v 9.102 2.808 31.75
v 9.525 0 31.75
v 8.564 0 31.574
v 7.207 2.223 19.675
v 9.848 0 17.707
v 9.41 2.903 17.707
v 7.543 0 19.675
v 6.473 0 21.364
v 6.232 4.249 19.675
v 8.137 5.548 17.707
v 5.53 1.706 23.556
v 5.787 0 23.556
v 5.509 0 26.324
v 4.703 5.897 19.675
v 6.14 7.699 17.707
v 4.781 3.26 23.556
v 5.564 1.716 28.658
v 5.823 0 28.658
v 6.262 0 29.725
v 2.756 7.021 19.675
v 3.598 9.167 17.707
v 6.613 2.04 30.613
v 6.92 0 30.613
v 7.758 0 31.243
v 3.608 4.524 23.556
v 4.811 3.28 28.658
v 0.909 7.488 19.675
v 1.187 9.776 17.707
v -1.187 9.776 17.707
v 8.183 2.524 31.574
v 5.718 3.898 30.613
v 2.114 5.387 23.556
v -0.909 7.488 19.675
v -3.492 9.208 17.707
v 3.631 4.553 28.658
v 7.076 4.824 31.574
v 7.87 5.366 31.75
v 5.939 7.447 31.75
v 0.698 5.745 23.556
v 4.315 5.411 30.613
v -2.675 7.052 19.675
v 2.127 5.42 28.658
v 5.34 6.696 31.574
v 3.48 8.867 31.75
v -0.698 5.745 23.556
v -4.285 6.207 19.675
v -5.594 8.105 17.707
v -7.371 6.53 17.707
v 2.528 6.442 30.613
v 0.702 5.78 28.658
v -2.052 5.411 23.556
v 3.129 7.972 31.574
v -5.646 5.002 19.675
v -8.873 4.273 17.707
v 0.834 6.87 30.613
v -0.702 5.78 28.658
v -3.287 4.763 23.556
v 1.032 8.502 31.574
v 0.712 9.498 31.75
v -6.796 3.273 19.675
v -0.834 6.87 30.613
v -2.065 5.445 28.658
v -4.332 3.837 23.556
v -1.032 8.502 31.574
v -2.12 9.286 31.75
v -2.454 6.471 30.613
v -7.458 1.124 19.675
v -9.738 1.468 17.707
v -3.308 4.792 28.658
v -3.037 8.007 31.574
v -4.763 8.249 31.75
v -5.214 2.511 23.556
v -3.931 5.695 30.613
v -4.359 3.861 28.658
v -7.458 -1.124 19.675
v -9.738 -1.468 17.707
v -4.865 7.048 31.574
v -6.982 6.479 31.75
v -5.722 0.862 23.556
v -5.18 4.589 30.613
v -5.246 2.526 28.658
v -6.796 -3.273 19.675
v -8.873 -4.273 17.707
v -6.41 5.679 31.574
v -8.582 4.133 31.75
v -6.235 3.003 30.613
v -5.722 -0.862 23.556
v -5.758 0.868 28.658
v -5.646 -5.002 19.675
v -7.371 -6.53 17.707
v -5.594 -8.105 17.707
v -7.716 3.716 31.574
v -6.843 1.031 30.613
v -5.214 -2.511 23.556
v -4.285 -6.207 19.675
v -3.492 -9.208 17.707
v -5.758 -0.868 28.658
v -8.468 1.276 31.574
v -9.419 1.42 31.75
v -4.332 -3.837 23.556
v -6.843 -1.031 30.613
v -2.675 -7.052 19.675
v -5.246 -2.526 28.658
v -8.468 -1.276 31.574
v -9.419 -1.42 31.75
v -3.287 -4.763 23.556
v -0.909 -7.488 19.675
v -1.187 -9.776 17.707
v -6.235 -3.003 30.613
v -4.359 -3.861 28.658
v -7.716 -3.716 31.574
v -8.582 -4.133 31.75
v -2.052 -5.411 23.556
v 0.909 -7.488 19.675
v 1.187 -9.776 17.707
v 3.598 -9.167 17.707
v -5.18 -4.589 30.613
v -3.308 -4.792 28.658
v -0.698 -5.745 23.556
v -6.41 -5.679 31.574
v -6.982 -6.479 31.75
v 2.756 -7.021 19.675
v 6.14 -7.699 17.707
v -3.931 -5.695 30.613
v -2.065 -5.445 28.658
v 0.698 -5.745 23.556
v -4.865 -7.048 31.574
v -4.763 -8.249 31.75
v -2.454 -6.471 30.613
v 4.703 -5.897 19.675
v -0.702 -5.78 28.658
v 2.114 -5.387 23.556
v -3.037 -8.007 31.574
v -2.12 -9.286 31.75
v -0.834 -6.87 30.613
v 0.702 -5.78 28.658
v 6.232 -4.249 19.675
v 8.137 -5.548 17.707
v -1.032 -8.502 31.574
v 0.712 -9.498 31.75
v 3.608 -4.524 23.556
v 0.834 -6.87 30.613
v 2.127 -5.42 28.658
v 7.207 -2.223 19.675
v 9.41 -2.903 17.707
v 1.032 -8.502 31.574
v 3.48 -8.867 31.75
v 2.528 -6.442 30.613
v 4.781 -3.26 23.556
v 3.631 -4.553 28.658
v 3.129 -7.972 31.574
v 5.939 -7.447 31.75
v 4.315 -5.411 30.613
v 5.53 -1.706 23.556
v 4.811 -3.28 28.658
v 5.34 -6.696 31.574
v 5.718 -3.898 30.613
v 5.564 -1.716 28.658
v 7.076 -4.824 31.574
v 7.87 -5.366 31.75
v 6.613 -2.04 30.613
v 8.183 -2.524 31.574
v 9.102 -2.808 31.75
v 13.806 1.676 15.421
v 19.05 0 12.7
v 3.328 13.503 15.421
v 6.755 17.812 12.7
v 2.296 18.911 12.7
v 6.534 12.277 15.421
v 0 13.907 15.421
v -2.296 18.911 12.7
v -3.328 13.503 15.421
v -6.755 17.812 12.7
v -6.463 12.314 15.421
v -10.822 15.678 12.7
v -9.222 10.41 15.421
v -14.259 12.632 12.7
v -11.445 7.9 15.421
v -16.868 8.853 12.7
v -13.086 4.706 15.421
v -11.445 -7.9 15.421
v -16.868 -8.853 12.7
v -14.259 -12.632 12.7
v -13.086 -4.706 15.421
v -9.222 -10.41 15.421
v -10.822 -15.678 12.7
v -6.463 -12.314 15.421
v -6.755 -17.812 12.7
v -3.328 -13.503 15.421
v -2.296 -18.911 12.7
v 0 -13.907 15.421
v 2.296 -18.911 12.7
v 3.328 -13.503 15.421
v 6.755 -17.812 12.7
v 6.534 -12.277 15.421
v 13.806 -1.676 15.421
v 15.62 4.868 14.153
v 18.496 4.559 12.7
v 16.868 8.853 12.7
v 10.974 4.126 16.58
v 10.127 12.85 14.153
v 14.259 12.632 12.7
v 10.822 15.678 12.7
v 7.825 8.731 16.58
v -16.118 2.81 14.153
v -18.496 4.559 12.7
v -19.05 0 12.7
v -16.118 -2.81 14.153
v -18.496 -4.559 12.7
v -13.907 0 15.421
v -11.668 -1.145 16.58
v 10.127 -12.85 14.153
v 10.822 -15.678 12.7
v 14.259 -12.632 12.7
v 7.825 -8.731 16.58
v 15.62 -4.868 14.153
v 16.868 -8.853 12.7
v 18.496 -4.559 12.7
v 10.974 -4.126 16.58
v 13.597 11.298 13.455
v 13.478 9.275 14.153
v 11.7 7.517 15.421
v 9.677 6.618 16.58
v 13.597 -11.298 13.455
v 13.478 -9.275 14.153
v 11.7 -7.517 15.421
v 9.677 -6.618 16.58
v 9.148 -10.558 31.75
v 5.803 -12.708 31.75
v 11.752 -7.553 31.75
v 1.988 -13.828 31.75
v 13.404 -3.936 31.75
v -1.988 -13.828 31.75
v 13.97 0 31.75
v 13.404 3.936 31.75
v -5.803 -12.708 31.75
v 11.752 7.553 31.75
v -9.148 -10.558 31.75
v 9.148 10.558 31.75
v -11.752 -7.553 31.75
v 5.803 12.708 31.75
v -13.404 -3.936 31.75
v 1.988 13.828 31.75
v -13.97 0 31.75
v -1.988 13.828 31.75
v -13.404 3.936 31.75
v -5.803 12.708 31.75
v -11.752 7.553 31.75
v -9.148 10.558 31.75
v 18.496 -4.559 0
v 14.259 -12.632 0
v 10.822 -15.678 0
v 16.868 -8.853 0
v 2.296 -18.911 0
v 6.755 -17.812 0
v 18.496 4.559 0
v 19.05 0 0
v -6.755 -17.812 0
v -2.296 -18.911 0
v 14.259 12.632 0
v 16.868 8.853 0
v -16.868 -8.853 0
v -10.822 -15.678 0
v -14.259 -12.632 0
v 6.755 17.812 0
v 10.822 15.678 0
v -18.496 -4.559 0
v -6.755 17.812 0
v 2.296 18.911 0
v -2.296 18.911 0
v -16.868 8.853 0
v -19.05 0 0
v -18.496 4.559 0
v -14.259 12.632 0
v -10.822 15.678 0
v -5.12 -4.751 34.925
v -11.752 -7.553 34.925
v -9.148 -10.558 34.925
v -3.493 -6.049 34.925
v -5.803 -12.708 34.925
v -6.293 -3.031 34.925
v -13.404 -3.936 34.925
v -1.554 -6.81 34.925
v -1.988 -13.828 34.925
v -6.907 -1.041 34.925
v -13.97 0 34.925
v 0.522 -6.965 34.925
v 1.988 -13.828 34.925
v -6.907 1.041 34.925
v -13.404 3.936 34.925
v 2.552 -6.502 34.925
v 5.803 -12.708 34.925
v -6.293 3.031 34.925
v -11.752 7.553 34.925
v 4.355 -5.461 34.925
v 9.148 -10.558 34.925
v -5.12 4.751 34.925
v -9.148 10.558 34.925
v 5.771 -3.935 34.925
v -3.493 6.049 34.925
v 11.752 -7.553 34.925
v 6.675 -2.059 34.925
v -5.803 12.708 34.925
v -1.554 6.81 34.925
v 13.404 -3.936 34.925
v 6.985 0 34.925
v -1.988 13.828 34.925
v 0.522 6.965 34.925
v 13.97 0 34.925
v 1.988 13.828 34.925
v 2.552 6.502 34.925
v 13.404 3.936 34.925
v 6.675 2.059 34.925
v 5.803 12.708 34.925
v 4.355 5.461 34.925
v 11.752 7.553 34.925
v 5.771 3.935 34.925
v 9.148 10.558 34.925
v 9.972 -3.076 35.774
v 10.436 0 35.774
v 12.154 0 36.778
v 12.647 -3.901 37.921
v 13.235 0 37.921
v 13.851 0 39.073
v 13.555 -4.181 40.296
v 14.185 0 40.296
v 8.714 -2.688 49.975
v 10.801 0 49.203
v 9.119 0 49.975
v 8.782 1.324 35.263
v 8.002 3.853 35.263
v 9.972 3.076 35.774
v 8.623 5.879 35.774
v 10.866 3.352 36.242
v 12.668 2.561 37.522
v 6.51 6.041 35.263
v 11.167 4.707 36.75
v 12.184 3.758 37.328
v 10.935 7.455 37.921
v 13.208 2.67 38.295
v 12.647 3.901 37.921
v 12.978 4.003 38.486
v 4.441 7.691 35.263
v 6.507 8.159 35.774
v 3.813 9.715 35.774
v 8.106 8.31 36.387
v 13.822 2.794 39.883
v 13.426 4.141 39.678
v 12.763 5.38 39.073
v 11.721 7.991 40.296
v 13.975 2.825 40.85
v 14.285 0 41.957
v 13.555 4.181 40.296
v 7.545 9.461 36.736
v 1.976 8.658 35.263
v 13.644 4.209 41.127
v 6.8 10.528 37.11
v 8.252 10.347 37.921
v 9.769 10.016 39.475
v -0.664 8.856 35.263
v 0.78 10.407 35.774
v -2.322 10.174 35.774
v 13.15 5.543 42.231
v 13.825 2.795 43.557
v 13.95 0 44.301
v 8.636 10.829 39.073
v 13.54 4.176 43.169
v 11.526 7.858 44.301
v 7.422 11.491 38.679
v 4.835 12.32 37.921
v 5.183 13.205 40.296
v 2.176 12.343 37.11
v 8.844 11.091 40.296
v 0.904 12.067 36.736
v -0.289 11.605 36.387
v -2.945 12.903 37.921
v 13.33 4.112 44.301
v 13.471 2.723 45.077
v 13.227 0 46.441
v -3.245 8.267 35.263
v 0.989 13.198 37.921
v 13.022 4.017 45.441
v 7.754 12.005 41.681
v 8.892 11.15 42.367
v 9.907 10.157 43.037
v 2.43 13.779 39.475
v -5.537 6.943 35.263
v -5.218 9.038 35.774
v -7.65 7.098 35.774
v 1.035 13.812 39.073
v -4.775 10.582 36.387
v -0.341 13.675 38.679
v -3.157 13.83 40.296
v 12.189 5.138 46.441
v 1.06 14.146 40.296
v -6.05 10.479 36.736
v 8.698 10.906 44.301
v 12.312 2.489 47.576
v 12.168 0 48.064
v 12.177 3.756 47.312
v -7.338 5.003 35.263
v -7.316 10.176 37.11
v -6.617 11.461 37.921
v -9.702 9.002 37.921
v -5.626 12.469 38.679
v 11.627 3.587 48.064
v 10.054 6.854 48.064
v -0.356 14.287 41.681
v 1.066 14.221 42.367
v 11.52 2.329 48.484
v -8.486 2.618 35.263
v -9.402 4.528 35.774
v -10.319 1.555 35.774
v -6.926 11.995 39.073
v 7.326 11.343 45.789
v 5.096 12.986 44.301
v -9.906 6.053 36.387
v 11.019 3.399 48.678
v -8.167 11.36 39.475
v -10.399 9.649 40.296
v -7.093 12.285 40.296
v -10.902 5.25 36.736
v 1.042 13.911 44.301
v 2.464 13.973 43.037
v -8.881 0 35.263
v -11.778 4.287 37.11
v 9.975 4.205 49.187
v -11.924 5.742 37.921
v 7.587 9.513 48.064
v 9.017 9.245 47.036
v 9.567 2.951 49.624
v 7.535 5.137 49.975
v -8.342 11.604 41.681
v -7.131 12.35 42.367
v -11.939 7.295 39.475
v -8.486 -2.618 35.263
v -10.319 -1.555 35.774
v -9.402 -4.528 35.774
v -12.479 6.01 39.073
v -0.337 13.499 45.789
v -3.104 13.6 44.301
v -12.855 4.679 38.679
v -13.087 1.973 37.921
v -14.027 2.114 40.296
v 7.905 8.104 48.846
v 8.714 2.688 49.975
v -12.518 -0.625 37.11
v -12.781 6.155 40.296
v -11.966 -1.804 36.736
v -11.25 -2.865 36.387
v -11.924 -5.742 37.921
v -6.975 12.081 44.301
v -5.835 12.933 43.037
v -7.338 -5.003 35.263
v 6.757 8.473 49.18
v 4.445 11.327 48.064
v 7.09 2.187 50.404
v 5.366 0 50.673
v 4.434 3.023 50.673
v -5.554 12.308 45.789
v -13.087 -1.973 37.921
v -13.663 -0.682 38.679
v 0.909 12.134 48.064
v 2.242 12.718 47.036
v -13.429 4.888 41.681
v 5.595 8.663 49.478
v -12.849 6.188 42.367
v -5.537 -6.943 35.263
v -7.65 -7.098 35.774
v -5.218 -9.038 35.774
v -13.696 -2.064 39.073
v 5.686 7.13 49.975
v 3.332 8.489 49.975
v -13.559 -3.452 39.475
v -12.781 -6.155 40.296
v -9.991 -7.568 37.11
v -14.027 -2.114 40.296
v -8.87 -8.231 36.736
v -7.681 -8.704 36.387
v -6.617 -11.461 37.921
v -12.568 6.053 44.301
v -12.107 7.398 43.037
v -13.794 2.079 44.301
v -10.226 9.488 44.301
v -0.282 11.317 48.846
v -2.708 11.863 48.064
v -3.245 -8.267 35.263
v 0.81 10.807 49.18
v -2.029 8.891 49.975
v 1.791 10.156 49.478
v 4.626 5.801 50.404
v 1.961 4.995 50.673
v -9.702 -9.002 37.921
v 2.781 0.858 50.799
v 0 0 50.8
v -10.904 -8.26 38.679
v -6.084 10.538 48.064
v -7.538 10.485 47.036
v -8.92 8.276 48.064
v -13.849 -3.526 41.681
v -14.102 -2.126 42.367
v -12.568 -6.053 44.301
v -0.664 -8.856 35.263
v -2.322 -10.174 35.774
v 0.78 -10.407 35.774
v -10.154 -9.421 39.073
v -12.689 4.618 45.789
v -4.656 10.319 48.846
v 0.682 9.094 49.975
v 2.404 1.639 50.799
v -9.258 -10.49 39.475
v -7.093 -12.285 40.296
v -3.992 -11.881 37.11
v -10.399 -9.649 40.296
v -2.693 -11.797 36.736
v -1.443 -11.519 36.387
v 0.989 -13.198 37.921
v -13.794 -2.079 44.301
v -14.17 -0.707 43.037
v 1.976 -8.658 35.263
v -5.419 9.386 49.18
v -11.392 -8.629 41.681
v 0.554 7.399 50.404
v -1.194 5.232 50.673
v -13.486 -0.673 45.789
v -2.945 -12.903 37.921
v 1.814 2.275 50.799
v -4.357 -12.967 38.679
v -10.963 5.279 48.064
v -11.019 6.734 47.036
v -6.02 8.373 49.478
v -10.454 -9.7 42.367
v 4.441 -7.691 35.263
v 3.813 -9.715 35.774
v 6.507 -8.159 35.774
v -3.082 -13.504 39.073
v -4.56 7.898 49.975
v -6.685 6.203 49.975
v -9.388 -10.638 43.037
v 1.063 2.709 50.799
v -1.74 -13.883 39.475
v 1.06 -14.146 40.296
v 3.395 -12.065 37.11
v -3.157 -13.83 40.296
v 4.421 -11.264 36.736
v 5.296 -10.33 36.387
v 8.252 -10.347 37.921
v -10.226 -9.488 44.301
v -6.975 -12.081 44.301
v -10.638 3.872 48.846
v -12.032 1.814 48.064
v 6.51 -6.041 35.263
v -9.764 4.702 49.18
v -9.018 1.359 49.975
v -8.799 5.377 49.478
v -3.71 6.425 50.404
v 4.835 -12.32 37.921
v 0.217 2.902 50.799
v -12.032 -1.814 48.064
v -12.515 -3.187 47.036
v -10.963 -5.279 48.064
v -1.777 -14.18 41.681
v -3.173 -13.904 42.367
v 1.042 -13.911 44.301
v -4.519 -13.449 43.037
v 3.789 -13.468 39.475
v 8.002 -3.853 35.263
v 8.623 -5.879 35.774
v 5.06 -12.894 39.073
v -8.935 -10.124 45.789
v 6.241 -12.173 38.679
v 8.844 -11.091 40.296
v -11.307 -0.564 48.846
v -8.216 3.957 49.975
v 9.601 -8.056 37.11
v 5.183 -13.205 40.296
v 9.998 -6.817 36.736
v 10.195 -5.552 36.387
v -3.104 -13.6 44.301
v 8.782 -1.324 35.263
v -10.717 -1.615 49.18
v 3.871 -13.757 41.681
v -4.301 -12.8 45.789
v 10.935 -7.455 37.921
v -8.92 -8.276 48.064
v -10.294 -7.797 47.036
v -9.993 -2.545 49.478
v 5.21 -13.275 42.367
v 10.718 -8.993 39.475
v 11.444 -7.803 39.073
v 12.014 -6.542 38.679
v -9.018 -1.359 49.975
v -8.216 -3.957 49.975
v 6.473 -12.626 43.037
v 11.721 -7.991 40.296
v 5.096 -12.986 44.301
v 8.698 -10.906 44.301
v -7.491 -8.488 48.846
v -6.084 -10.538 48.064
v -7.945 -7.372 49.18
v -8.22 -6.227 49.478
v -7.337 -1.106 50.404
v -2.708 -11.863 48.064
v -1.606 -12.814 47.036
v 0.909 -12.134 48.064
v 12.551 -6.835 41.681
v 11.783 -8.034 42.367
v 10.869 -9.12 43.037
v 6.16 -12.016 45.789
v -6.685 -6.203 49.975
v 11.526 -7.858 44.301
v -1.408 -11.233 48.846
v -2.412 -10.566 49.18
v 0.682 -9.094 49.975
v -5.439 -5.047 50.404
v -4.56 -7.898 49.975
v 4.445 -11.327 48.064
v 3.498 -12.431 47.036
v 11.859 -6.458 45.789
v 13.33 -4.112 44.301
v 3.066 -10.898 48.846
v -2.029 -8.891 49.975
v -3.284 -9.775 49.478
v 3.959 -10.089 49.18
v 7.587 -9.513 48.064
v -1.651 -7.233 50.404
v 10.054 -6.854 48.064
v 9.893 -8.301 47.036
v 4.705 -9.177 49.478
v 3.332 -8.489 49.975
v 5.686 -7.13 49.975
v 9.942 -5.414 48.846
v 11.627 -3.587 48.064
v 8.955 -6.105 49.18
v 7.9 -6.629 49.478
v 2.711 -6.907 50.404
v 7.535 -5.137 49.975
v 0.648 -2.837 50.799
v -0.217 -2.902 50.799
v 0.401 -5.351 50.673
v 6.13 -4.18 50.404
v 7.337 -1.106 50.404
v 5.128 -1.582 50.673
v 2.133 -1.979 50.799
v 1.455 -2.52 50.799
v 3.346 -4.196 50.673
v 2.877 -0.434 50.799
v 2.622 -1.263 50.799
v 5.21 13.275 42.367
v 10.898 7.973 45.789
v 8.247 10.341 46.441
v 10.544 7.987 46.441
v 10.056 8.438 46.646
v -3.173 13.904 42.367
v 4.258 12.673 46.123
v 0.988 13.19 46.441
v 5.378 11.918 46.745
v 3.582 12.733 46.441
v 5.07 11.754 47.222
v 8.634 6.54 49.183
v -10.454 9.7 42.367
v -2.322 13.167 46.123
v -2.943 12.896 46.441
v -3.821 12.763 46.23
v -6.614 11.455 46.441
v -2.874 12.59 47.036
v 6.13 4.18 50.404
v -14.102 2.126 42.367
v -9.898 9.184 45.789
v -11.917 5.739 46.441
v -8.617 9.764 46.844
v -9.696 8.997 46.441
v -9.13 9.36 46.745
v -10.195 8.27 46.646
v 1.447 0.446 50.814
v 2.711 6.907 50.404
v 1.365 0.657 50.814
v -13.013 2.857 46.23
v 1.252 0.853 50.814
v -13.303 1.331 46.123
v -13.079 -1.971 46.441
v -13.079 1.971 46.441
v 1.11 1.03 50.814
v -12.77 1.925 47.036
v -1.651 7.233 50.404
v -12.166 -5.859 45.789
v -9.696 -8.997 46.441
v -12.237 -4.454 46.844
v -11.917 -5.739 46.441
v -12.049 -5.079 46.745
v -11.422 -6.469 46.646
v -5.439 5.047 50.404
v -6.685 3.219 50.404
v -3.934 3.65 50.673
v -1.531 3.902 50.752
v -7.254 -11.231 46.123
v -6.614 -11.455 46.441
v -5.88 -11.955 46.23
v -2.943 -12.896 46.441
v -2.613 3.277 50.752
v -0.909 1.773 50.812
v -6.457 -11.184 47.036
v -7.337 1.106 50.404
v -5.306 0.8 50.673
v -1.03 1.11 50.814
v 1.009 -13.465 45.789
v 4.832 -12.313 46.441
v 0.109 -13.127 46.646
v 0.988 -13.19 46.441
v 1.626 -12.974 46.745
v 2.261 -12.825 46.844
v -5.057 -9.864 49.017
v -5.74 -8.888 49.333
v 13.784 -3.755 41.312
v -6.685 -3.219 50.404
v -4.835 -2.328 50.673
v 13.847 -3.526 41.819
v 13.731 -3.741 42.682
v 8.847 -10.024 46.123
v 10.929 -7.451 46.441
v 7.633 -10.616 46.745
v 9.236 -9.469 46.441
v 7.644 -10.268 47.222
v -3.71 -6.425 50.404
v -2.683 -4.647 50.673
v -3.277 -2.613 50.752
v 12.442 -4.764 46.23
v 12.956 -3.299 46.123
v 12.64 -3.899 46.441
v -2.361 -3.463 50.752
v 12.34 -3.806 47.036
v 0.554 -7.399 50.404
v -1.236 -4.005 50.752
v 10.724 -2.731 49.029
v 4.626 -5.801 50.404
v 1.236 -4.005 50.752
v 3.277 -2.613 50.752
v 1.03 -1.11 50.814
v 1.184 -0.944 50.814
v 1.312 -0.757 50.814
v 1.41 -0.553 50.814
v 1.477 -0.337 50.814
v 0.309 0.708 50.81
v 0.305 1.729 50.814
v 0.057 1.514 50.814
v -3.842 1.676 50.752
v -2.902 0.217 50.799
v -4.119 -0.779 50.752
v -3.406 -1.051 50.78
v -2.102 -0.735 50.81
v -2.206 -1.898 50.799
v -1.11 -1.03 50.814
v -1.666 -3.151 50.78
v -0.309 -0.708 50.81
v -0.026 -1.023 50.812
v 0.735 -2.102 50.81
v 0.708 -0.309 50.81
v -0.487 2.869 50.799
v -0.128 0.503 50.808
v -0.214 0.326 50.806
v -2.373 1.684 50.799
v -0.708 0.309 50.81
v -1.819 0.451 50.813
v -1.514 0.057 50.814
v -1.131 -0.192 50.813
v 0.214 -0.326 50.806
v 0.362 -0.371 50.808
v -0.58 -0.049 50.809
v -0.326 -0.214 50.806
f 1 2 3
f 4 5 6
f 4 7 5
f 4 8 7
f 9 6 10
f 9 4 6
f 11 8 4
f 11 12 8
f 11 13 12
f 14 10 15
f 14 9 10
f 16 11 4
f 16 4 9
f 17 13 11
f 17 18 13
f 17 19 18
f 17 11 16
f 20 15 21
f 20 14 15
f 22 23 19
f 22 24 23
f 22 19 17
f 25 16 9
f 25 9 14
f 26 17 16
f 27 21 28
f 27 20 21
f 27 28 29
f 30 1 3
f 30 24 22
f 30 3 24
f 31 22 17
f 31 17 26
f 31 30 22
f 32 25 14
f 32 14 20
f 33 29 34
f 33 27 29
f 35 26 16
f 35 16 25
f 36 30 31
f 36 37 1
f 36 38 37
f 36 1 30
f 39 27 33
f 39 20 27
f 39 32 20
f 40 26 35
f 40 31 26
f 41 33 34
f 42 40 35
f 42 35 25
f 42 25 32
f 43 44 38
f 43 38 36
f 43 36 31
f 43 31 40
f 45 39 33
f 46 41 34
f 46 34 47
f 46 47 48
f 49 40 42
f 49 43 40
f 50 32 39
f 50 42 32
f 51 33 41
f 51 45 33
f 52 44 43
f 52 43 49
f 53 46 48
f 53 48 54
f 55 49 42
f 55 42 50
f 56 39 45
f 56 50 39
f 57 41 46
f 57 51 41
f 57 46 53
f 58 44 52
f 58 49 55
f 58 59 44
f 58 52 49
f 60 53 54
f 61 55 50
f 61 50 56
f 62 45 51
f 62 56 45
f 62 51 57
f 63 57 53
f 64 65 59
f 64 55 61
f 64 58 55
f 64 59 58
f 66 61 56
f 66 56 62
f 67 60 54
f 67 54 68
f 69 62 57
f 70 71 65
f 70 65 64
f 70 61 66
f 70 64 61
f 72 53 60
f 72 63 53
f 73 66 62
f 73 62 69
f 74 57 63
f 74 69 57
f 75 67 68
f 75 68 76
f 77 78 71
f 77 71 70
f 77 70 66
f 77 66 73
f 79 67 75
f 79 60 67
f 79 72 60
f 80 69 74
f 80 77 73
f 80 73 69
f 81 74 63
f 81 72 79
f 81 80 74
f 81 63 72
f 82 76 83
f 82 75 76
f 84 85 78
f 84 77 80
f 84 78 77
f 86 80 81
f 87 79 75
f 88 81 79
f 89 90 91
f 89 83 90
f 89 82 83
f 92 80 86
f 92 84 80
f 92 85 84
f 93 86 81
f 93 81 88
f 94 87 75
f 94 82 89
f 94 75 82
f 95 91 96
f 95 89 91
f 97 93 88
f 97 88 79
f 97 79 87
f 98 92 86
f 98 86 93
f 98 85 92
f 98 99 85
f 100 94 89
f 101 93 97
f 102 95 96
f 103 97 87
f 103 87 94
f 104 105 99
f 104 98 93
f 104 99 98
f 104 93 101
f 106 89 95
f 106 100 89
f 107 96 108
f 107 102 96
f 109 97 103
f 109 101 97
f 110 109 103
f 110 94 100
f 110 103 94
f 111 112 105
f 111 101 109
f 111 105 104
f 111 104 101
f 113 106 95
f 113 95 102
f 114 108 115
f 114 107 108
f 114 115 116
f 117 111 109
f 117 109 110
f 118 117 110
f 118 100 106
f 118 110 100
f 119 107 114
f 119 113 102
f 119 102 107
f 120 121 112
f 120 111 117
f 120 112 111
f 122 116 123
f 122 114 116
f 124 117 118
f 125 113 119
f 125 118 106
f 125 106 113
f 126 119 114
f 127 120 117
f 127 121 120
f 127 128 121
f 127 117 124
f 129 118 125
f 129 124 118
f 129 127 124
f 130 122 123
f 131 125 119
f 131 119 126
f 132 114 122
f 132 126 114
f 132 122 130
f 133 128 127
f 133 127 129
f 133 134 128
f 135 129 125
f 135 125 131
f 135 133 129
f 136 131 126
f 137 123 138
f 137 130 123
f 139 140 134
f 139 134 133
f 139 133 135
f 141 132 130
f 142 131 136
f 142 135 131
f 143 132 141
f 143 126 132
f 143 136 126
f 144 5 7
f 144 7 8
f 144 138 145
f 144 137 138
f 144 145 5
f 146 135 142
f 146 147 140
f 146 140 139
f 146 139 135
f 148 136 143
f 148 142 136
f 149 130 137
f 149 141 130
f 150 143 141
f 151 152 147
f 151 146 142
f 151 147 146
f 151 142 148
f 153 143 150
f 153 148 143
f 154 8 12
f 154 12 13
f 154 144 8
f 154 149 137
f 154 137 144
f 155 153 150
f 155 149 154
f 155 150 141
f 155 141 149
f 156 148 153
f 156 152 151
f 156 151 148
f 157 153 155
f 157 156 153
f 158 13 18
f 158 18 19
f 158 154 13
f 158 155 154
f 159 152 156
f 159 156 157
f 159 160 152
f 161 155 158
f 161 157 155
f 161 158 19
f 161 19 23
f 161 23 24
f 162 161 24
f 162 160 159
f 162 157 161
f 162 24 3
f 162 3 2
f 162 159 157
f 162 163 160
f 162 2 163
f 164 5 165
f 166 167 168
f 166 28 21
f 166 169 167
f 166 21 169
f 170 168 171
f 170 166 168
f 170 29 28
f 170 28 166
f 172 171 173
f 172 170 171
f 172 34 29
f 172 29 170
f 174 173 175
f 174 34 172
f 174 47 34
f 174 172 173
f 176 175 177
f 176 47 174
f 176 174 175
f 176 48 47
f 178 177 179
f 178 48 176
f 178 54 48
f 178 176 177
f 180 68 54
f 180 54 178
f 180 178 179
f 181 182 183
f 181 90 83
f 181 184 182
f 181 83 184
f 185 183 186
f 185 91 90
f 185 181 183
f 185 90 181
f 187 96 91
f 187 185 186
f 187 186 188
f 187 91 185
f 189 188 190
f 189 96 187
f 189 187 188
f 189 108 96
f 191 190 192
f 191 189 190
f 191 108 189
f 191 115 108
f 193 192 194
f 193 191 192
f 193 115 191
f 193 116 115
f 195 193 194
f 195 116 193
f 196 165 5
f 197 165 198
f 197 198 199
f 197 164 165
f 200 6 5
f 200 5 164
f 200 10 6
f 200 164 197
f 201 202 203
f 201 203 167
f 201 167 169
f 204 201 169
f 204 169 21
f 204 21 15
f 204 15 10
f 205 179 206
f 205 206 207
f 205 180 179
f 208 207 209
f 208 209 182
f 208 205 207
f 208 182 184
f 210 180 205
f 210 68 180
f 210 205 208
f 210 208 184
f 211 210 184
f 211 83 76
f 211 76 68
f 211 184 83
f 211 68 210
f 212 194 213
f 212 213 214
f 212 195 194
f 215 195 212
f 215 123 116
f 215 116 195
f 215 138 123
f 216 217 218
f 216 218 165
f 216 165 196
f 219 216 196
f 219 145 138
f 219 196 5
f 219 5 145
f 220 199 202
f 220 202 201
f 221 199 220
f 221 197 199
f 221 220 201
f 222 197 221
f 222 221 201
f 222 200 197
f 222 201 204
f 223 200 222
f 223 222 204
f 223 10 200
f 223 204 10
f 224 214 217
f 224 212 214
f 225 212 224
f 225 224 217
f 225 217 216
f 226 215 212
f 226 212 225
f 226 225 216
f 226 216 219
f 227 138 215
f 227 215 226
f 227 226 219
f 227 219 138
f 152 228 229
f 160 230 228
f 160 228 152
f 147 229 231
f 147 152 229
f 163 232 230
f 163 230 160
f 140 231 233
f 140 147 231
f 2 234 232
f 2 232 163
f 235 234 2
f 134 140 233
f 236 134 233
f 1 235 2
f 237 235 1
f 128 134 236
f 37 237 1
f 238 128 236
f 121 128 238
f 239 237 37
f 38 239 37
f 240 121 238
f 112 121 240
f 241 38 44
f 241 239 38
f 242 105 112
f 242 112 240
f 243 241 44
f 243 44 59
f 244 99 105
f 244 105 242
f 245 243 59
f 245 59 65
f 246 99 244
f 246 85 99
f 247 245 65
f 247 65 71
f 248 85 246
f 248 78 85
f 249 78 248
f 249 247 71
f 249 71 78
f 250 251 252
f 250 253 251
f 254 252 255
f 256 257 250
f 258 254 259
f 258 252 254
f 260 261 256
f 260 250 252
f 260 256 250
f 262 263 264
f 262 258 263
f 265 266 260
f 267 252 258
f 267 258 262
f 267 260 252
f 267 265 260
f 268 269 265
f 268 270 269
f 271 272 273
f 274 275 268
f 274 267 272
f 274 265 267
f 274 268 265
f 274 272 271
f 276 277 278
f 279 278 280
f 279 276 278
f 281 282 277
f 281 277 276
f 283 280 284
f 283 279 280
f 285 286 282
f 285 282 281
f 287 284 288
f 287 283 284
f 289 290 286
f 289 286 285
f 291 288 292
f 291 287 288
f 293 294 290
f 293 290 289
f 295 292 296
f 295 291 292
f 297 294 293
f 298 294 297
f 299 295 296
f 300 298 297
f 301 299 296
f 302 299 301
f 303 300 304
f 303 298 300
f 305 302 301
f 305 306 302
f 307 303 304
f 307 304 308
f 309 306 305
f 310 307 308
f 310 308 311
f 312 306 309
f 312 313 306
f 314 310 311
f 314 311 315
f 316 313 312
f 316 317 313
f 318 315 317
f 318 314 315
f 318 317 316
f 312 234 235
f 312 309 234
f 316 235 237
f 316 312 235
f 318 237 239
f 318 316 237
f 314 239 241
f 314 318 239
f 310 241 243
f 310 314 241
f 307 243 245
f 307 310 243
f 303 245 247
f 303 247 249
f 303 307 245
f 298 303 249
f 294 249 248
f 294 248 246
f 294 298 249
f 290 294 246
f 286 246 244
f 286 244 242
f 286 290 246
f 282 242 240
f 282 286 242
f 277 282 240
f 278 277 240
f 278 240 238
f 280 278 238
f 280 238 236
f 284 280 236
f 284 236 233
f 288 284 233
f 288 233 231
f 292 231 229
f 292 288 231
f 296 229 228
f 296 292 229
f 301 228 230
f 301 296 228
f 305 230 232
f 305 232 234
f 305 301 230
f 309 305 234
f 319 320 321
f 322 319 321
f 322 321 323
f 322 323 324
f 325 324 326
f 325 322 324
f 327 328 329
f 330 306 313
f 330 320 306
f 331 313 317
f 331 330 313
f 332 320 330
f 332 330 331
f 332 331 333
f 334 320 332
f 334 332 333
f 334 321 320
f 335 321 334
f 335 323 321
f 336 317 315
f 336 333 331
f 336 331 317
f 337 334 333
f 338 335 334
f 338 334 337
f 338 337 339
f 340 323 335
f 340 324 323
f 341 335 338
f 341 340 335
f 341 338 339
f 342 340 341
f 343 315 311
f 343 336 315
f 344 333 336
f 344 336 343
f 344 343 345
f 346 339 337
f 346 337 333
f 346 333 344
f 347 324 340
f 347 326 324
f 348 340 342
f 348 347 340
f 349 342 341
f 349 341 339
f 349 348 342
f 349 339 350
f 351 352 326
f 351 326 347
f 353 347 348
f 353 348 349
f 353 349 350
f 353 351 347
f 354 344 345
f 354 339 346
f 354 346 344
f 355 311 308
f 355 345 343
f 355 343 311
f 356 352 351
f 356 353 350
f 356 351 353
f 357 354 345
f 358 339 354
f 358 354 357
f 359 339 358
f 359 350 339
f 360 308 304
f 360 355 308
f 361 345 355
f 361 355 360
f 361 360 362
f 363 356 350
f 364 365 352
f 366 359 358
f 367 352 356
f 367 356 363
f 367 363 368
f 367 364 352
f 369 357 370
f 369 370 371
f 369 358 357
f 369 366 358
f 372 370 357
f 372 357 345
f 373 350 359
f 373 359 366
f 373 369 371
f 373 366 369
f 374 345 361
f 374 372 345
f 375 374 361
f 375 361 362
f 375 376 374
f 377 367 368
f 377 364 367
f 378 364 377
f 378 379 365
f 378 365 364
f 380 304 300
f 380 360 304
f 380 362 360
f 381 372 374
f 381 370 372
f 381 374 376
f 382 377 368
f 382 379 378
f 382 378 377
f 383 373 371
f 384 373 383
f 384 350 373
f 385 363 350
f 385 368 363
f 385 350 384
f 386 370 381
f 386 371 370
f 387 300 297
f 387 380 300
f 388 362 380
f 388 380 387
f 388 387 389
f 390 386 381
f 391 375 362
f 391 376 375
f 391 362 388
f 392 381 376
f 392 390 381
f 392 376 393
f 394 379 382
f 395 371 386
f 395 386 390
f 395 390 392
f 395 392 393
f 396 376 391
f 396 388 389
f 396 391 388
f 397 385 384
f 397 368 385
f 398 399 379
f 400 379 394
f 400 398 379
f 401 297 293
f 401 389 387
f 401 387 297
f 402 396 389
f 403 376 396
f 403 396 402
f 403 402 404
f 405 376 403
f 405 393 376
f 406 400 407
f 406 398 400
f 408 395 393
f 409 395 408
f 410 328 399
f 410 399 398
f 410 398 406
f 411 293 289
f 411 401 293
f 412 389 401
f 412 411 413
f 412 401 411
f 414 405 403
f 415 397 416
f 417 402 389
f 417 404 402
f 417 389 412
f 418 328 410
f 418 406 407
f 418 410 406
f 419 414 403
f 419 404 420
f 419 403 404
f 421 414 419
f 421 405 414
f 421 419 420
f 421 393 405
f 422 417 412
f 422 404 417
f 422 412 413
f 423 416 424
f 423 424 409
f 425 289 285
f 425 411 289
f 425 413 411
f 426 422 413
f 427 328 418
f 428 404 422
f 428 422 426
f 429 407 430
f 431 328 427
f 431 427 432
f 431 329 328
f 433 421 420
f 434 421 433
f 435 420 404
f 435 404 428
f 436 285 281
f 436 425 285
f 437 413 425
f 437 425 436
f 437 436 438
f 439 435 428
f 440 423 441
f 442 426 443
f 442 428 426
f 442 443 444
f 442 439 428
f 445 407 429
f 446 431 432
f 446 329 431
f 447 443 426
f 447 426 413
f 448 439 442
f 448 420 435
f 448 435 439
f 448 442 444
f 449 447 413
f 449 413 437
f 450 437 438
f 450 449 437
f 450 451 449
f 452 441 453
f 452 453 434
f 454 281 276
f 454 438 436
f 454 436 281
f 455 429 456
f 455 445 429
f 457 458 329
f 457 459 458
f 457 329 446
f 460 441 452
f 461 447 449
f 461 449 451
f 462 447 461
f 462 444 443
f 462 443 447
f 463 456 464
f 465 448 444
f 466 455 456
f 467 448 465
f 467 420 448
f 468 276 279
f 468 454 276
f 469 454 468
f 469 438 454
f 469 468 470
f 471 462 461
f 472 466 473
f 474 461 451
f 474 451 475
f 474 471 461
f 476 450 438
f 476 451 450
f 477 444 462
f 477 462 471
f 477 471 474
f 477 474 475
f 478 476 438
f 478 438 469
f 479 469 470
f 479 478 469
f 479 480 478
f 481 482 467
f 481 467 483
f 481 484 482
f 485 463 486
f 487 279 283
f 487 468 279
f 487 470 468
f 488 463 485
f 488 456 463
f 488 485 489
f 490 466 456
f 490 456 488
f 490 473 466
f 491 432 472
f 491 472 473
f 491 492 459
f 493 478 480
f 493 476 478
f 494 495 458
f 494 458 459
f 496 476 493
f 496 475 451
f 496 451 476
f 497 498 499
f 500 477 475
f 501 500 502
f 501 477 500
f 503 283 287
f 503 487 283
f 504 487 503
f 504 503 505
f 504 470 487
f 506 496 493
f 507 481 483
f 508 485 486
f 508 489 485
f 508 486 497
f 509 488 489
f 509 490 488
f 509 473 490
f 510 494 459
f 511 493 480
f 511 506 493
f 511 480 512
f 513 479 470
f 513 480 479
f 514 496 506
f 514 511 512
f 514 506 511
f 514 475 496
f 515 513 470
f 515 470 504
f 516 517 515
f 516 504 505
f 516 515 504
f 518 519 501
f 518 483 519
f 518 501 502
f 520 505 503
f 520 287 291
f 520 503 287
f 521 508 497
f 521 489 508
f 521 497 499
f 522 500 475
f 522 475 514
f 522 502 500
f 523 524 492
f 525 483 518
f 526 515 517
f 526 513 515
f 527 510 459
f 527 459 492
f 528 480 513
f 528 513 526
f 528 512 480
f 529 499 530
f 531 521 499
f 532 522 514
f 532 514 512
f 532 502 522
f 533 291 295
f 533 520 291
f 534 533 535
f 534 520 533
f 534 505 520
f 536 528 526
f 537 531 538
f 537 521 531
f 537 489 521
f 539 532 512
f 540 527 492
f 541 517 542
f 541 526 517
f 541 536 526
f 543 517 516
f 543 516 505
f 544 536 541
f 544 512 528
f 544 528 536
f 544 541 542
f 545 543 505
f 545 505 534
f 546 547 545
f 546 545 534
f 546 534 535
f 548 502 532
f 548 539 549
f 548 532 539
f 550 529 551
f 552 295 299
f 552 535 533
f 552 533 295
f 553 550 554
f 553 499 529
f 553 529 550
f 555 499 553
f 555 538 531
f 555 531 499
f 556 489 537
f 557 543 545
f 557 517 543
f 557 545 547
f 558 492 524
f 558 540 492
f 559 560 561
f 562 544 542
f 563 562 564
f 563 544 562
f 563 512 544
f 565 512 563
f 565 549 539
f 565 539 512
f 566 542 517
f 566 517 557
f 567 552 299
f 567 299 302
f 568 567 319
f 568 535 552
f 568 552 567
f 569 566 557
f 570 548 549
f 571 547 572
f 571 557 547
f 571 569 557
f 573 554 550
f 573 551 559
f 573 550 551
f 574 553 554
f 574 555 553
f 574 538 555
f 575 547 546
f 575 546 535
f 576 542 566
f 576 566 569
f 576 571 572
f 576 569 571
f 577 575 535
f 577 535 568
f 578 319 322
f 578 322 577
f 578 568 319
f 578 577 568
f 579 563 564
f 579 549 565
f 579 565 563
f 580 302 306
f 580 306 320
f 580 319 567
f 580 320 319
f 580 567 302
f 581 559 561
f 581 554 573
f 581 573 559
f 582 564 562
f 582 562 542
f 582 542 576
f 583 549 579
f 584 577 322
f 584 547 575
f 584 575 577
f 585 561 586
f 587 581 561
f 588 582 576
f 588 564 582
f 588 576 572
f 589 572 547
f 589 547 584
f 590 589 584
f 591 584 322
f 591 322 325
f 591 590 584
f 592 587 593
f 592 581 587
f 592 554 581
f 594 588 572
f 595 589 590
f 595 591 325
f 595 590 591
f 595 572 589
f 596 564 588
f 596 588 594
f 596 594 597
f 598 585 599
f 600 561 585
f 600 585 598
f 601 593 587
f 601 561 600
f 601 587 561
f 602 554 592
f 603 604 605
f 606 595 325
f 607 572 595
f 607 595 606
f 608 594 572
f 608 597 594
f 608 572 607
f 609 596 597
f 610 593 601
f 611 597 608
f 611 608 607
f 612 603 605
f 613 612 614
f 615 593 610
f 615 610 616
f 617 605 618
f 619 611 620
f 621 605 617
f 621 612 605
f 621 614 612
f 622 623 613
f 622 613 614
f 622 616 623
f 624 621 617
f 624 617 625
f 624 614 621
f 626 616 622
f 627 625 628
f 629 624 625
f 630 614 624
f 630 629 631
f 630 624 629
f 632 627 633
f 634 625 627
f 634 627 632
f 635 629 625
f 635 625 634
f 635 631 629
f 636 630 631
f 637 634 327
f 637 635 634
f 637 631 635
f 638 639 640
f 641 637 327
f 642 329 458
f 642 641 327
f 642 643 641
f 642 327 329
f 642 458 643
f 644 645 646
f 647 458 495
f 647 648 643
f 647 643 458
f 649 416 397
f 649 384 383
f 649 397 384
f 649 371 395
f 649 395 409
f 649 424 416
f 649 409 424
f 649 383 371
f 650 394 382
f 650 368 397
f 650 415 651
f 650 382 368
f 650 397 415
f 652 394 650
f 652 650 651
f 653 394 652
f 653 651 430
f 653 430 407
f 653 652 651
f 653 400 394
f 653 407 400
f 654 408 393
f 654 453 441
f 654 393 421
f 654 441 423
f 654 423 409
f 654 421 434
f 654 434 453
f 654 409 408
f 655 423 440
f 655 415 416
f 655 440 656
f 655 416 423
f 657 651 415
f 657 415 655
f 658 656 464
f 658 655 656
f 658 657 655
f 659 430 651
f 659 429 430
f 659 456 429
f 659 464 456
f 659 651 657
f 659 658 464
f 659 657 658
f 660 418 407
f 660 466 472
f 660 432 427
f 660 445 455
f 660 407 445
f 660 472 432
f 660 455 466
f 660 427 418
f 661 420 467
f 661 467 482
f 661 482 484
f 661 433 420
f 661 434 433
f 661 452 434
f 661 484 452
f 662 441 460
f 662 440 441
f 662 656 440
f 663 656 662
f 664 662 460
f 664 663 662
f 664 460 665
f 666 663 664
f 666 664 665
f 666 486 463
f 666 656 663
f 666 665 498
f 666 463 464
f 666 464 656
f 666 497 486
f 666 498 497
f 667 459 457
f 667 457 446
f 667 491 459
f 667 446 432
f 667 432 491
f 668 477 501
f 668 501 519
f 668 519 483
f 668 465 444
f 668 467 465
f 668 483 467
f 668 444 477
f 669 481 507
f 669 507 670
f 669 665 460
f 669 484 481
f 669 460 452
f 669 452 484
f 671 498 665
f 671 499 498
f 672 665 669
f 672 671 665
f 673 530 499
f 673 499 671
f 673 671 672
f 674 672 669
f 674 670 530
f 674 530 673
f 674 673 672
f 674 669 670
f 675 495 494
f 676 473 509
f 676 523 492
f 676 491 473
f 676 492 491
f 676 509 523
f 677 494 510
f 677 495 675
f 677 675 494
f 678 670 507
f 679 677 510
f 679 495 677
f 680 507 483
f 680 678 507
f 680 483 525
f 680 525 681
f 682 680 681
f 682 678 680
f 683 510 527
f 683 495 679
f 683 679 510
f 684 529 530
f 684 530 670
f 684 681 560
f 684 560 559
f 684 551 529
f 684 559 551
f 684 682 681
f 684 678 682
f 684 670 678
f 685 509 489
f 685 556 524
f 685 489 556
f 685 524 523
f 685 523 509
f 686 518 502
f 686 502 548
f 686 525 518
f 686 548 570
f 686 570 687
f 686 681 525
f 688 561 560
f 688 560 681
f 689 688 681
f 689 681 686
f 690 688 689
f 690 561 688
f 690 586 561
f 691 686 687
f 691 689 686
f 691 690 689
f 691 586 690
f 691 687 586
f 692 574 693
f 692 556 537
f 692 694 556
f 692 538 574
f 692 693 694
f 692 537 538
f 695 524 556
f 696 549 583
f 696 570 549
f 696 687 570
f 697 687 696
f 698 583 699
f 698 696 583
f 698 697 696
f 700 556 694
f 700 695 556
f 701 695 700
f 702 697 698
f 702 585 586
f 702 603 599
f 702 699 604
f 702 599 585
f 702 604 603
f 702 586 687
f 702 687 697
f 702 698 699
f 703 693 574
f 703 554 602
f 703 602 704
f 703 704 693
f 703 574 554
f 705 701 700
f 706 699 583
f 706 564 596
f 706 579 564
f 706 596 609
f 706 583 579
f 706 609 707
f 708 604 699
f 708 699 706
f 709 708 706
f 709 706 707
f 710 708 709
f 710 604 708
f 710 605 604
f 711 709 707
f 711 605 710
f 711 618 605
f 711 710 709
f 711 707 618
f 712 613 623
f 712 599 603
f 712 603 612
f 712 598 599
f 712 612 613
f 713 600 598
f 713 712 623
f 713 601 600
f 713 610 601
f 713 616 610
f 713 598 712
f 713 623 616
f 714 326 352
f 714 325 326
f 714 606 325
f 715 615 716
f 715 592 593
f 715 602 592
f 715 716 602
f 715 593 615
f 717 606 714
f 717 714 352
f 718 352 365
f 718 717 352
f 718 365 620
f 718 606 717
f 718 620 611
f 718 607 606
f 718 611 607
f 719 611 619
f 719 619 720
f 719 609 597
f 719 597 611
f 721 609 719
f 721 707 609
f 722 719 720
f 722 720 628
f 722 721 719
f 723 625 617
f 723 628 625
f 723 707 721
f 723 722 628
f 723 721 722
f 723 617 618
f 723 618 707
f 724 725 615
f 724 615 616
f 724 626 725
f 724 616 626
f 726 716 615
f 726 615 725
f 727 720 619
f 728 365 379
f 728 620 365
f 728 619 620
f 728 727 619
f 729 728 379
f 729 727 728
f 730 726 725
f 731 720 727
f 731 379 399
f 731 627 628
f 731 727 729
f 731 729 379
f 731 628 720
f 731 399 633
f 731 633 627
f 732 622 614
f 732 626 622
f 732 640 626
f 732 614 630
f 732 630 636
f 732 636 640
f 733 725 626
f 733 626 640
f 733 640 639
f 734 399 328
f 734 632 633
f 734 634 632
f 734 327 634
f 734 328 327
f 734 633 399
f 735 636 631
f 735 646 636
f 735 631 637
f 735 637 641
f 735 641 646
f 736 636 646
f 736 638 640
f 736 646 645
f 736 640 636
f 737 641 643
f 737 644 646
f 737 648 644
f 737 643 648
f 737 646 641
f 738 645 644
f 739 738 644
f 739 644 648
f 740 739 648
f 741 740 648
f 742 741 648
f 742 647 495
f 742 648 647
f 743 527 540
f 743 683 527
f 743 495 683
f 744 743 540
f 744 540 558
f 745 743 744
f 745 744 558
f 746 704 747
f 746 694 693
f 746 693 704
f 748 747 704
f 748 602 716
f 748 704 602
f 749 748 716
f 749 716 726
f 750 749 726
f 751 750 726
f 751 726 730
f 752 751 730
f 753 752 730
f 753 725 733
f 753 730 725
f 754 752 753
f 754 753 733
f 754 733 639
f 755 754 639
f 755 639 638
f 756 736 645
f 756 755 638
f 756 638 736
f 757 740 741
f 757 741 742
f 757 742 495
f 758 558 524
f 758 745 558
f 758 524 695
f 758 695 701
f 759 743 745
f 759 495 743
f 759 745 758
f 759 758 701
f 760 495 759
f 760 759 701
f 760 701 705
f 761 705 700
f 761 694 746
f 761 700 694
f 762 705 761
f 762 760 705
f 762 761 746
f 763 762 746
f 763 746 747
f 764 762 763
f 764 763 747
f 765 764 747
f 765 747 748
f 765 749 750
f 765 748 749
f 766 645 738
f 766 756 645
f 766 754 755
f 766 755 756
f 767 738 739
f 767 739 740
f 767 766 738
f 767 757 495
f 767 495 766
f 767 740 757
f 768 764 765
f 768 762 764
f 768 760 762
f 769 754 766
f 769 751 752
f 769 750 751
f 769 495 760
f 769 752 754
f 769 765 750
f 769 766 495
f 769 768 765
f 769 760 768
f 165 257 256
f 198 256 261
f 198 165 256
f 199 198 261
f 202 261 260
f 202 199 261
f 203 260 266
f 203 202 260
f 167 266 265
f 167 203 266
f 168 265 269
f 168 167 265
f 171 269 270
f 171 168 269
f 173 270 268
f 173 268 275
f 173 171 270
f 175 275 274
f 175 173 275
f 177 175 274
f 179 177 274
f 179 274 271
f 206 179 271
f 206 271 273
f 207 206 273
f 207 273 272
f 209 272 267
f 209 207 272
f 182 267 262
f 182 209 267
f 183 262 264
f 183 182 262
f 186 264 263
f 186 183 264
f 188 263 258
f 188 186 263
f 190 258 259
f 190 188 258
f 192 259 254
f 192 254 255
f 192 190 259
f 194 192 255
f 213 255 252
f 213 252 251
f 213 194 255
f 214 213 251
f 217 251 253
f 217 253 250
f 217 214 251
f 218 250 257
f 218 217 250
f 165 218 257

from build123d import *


with BuildPart() as f1:
    # F0 (on Front) → F1 (revolve)
    with BuildSketch(Plane.XZ):
        with BuildLine():
            Line((0, 50.8), (0, 34.925))
            Line((0, 34.925), (6.985, 34.925))
            add(Edge.make_bspline(
                [(6.985, 34.925), (14.7014663656, 35.8285003282), (14.7579266168, 44.3466005075), (11.2465458357, 50.1659365692), (5.7059846608, 50.9006321078), (0, 50.8)],
                knots=[0, 0, 0, 0, 0.372820087, 0.6340680412, 1, 1, 1, 1], degree=3))
        make_face()
        Polygon((0, 34.925), (0, 31.75), (9.525, 31.75), (13.97, 31.75), (13.97, 34.925), (6.985, 34.925), align=None)
        with BuildLine():
            Line((0, 31.75), (0, 0))
            Line((0, 0), (19.05, 0))
            Line((19.05, 0), (19.05, 12.7))
            add(Edge.make_bspline(
                [(19.05, 12.7), (14.7852268247, 15.0992752294), (8.6001992559, 17.6645746008), (5.0451952411, 22.9375174572), (5.3303460288, 31.3768557704), (9.525, 31.75)],
                knots=[0, 0, 0, 0, 0.3838360582, 0.6646815416, 1, 1, 1, 1], degree=3))
            Line((9.525, 31.75), (0, 31.75))
        make_face()
    revolve(axis=Axis((0, 0, 25.4), (0, 0, 1)))


solid = f1.part
